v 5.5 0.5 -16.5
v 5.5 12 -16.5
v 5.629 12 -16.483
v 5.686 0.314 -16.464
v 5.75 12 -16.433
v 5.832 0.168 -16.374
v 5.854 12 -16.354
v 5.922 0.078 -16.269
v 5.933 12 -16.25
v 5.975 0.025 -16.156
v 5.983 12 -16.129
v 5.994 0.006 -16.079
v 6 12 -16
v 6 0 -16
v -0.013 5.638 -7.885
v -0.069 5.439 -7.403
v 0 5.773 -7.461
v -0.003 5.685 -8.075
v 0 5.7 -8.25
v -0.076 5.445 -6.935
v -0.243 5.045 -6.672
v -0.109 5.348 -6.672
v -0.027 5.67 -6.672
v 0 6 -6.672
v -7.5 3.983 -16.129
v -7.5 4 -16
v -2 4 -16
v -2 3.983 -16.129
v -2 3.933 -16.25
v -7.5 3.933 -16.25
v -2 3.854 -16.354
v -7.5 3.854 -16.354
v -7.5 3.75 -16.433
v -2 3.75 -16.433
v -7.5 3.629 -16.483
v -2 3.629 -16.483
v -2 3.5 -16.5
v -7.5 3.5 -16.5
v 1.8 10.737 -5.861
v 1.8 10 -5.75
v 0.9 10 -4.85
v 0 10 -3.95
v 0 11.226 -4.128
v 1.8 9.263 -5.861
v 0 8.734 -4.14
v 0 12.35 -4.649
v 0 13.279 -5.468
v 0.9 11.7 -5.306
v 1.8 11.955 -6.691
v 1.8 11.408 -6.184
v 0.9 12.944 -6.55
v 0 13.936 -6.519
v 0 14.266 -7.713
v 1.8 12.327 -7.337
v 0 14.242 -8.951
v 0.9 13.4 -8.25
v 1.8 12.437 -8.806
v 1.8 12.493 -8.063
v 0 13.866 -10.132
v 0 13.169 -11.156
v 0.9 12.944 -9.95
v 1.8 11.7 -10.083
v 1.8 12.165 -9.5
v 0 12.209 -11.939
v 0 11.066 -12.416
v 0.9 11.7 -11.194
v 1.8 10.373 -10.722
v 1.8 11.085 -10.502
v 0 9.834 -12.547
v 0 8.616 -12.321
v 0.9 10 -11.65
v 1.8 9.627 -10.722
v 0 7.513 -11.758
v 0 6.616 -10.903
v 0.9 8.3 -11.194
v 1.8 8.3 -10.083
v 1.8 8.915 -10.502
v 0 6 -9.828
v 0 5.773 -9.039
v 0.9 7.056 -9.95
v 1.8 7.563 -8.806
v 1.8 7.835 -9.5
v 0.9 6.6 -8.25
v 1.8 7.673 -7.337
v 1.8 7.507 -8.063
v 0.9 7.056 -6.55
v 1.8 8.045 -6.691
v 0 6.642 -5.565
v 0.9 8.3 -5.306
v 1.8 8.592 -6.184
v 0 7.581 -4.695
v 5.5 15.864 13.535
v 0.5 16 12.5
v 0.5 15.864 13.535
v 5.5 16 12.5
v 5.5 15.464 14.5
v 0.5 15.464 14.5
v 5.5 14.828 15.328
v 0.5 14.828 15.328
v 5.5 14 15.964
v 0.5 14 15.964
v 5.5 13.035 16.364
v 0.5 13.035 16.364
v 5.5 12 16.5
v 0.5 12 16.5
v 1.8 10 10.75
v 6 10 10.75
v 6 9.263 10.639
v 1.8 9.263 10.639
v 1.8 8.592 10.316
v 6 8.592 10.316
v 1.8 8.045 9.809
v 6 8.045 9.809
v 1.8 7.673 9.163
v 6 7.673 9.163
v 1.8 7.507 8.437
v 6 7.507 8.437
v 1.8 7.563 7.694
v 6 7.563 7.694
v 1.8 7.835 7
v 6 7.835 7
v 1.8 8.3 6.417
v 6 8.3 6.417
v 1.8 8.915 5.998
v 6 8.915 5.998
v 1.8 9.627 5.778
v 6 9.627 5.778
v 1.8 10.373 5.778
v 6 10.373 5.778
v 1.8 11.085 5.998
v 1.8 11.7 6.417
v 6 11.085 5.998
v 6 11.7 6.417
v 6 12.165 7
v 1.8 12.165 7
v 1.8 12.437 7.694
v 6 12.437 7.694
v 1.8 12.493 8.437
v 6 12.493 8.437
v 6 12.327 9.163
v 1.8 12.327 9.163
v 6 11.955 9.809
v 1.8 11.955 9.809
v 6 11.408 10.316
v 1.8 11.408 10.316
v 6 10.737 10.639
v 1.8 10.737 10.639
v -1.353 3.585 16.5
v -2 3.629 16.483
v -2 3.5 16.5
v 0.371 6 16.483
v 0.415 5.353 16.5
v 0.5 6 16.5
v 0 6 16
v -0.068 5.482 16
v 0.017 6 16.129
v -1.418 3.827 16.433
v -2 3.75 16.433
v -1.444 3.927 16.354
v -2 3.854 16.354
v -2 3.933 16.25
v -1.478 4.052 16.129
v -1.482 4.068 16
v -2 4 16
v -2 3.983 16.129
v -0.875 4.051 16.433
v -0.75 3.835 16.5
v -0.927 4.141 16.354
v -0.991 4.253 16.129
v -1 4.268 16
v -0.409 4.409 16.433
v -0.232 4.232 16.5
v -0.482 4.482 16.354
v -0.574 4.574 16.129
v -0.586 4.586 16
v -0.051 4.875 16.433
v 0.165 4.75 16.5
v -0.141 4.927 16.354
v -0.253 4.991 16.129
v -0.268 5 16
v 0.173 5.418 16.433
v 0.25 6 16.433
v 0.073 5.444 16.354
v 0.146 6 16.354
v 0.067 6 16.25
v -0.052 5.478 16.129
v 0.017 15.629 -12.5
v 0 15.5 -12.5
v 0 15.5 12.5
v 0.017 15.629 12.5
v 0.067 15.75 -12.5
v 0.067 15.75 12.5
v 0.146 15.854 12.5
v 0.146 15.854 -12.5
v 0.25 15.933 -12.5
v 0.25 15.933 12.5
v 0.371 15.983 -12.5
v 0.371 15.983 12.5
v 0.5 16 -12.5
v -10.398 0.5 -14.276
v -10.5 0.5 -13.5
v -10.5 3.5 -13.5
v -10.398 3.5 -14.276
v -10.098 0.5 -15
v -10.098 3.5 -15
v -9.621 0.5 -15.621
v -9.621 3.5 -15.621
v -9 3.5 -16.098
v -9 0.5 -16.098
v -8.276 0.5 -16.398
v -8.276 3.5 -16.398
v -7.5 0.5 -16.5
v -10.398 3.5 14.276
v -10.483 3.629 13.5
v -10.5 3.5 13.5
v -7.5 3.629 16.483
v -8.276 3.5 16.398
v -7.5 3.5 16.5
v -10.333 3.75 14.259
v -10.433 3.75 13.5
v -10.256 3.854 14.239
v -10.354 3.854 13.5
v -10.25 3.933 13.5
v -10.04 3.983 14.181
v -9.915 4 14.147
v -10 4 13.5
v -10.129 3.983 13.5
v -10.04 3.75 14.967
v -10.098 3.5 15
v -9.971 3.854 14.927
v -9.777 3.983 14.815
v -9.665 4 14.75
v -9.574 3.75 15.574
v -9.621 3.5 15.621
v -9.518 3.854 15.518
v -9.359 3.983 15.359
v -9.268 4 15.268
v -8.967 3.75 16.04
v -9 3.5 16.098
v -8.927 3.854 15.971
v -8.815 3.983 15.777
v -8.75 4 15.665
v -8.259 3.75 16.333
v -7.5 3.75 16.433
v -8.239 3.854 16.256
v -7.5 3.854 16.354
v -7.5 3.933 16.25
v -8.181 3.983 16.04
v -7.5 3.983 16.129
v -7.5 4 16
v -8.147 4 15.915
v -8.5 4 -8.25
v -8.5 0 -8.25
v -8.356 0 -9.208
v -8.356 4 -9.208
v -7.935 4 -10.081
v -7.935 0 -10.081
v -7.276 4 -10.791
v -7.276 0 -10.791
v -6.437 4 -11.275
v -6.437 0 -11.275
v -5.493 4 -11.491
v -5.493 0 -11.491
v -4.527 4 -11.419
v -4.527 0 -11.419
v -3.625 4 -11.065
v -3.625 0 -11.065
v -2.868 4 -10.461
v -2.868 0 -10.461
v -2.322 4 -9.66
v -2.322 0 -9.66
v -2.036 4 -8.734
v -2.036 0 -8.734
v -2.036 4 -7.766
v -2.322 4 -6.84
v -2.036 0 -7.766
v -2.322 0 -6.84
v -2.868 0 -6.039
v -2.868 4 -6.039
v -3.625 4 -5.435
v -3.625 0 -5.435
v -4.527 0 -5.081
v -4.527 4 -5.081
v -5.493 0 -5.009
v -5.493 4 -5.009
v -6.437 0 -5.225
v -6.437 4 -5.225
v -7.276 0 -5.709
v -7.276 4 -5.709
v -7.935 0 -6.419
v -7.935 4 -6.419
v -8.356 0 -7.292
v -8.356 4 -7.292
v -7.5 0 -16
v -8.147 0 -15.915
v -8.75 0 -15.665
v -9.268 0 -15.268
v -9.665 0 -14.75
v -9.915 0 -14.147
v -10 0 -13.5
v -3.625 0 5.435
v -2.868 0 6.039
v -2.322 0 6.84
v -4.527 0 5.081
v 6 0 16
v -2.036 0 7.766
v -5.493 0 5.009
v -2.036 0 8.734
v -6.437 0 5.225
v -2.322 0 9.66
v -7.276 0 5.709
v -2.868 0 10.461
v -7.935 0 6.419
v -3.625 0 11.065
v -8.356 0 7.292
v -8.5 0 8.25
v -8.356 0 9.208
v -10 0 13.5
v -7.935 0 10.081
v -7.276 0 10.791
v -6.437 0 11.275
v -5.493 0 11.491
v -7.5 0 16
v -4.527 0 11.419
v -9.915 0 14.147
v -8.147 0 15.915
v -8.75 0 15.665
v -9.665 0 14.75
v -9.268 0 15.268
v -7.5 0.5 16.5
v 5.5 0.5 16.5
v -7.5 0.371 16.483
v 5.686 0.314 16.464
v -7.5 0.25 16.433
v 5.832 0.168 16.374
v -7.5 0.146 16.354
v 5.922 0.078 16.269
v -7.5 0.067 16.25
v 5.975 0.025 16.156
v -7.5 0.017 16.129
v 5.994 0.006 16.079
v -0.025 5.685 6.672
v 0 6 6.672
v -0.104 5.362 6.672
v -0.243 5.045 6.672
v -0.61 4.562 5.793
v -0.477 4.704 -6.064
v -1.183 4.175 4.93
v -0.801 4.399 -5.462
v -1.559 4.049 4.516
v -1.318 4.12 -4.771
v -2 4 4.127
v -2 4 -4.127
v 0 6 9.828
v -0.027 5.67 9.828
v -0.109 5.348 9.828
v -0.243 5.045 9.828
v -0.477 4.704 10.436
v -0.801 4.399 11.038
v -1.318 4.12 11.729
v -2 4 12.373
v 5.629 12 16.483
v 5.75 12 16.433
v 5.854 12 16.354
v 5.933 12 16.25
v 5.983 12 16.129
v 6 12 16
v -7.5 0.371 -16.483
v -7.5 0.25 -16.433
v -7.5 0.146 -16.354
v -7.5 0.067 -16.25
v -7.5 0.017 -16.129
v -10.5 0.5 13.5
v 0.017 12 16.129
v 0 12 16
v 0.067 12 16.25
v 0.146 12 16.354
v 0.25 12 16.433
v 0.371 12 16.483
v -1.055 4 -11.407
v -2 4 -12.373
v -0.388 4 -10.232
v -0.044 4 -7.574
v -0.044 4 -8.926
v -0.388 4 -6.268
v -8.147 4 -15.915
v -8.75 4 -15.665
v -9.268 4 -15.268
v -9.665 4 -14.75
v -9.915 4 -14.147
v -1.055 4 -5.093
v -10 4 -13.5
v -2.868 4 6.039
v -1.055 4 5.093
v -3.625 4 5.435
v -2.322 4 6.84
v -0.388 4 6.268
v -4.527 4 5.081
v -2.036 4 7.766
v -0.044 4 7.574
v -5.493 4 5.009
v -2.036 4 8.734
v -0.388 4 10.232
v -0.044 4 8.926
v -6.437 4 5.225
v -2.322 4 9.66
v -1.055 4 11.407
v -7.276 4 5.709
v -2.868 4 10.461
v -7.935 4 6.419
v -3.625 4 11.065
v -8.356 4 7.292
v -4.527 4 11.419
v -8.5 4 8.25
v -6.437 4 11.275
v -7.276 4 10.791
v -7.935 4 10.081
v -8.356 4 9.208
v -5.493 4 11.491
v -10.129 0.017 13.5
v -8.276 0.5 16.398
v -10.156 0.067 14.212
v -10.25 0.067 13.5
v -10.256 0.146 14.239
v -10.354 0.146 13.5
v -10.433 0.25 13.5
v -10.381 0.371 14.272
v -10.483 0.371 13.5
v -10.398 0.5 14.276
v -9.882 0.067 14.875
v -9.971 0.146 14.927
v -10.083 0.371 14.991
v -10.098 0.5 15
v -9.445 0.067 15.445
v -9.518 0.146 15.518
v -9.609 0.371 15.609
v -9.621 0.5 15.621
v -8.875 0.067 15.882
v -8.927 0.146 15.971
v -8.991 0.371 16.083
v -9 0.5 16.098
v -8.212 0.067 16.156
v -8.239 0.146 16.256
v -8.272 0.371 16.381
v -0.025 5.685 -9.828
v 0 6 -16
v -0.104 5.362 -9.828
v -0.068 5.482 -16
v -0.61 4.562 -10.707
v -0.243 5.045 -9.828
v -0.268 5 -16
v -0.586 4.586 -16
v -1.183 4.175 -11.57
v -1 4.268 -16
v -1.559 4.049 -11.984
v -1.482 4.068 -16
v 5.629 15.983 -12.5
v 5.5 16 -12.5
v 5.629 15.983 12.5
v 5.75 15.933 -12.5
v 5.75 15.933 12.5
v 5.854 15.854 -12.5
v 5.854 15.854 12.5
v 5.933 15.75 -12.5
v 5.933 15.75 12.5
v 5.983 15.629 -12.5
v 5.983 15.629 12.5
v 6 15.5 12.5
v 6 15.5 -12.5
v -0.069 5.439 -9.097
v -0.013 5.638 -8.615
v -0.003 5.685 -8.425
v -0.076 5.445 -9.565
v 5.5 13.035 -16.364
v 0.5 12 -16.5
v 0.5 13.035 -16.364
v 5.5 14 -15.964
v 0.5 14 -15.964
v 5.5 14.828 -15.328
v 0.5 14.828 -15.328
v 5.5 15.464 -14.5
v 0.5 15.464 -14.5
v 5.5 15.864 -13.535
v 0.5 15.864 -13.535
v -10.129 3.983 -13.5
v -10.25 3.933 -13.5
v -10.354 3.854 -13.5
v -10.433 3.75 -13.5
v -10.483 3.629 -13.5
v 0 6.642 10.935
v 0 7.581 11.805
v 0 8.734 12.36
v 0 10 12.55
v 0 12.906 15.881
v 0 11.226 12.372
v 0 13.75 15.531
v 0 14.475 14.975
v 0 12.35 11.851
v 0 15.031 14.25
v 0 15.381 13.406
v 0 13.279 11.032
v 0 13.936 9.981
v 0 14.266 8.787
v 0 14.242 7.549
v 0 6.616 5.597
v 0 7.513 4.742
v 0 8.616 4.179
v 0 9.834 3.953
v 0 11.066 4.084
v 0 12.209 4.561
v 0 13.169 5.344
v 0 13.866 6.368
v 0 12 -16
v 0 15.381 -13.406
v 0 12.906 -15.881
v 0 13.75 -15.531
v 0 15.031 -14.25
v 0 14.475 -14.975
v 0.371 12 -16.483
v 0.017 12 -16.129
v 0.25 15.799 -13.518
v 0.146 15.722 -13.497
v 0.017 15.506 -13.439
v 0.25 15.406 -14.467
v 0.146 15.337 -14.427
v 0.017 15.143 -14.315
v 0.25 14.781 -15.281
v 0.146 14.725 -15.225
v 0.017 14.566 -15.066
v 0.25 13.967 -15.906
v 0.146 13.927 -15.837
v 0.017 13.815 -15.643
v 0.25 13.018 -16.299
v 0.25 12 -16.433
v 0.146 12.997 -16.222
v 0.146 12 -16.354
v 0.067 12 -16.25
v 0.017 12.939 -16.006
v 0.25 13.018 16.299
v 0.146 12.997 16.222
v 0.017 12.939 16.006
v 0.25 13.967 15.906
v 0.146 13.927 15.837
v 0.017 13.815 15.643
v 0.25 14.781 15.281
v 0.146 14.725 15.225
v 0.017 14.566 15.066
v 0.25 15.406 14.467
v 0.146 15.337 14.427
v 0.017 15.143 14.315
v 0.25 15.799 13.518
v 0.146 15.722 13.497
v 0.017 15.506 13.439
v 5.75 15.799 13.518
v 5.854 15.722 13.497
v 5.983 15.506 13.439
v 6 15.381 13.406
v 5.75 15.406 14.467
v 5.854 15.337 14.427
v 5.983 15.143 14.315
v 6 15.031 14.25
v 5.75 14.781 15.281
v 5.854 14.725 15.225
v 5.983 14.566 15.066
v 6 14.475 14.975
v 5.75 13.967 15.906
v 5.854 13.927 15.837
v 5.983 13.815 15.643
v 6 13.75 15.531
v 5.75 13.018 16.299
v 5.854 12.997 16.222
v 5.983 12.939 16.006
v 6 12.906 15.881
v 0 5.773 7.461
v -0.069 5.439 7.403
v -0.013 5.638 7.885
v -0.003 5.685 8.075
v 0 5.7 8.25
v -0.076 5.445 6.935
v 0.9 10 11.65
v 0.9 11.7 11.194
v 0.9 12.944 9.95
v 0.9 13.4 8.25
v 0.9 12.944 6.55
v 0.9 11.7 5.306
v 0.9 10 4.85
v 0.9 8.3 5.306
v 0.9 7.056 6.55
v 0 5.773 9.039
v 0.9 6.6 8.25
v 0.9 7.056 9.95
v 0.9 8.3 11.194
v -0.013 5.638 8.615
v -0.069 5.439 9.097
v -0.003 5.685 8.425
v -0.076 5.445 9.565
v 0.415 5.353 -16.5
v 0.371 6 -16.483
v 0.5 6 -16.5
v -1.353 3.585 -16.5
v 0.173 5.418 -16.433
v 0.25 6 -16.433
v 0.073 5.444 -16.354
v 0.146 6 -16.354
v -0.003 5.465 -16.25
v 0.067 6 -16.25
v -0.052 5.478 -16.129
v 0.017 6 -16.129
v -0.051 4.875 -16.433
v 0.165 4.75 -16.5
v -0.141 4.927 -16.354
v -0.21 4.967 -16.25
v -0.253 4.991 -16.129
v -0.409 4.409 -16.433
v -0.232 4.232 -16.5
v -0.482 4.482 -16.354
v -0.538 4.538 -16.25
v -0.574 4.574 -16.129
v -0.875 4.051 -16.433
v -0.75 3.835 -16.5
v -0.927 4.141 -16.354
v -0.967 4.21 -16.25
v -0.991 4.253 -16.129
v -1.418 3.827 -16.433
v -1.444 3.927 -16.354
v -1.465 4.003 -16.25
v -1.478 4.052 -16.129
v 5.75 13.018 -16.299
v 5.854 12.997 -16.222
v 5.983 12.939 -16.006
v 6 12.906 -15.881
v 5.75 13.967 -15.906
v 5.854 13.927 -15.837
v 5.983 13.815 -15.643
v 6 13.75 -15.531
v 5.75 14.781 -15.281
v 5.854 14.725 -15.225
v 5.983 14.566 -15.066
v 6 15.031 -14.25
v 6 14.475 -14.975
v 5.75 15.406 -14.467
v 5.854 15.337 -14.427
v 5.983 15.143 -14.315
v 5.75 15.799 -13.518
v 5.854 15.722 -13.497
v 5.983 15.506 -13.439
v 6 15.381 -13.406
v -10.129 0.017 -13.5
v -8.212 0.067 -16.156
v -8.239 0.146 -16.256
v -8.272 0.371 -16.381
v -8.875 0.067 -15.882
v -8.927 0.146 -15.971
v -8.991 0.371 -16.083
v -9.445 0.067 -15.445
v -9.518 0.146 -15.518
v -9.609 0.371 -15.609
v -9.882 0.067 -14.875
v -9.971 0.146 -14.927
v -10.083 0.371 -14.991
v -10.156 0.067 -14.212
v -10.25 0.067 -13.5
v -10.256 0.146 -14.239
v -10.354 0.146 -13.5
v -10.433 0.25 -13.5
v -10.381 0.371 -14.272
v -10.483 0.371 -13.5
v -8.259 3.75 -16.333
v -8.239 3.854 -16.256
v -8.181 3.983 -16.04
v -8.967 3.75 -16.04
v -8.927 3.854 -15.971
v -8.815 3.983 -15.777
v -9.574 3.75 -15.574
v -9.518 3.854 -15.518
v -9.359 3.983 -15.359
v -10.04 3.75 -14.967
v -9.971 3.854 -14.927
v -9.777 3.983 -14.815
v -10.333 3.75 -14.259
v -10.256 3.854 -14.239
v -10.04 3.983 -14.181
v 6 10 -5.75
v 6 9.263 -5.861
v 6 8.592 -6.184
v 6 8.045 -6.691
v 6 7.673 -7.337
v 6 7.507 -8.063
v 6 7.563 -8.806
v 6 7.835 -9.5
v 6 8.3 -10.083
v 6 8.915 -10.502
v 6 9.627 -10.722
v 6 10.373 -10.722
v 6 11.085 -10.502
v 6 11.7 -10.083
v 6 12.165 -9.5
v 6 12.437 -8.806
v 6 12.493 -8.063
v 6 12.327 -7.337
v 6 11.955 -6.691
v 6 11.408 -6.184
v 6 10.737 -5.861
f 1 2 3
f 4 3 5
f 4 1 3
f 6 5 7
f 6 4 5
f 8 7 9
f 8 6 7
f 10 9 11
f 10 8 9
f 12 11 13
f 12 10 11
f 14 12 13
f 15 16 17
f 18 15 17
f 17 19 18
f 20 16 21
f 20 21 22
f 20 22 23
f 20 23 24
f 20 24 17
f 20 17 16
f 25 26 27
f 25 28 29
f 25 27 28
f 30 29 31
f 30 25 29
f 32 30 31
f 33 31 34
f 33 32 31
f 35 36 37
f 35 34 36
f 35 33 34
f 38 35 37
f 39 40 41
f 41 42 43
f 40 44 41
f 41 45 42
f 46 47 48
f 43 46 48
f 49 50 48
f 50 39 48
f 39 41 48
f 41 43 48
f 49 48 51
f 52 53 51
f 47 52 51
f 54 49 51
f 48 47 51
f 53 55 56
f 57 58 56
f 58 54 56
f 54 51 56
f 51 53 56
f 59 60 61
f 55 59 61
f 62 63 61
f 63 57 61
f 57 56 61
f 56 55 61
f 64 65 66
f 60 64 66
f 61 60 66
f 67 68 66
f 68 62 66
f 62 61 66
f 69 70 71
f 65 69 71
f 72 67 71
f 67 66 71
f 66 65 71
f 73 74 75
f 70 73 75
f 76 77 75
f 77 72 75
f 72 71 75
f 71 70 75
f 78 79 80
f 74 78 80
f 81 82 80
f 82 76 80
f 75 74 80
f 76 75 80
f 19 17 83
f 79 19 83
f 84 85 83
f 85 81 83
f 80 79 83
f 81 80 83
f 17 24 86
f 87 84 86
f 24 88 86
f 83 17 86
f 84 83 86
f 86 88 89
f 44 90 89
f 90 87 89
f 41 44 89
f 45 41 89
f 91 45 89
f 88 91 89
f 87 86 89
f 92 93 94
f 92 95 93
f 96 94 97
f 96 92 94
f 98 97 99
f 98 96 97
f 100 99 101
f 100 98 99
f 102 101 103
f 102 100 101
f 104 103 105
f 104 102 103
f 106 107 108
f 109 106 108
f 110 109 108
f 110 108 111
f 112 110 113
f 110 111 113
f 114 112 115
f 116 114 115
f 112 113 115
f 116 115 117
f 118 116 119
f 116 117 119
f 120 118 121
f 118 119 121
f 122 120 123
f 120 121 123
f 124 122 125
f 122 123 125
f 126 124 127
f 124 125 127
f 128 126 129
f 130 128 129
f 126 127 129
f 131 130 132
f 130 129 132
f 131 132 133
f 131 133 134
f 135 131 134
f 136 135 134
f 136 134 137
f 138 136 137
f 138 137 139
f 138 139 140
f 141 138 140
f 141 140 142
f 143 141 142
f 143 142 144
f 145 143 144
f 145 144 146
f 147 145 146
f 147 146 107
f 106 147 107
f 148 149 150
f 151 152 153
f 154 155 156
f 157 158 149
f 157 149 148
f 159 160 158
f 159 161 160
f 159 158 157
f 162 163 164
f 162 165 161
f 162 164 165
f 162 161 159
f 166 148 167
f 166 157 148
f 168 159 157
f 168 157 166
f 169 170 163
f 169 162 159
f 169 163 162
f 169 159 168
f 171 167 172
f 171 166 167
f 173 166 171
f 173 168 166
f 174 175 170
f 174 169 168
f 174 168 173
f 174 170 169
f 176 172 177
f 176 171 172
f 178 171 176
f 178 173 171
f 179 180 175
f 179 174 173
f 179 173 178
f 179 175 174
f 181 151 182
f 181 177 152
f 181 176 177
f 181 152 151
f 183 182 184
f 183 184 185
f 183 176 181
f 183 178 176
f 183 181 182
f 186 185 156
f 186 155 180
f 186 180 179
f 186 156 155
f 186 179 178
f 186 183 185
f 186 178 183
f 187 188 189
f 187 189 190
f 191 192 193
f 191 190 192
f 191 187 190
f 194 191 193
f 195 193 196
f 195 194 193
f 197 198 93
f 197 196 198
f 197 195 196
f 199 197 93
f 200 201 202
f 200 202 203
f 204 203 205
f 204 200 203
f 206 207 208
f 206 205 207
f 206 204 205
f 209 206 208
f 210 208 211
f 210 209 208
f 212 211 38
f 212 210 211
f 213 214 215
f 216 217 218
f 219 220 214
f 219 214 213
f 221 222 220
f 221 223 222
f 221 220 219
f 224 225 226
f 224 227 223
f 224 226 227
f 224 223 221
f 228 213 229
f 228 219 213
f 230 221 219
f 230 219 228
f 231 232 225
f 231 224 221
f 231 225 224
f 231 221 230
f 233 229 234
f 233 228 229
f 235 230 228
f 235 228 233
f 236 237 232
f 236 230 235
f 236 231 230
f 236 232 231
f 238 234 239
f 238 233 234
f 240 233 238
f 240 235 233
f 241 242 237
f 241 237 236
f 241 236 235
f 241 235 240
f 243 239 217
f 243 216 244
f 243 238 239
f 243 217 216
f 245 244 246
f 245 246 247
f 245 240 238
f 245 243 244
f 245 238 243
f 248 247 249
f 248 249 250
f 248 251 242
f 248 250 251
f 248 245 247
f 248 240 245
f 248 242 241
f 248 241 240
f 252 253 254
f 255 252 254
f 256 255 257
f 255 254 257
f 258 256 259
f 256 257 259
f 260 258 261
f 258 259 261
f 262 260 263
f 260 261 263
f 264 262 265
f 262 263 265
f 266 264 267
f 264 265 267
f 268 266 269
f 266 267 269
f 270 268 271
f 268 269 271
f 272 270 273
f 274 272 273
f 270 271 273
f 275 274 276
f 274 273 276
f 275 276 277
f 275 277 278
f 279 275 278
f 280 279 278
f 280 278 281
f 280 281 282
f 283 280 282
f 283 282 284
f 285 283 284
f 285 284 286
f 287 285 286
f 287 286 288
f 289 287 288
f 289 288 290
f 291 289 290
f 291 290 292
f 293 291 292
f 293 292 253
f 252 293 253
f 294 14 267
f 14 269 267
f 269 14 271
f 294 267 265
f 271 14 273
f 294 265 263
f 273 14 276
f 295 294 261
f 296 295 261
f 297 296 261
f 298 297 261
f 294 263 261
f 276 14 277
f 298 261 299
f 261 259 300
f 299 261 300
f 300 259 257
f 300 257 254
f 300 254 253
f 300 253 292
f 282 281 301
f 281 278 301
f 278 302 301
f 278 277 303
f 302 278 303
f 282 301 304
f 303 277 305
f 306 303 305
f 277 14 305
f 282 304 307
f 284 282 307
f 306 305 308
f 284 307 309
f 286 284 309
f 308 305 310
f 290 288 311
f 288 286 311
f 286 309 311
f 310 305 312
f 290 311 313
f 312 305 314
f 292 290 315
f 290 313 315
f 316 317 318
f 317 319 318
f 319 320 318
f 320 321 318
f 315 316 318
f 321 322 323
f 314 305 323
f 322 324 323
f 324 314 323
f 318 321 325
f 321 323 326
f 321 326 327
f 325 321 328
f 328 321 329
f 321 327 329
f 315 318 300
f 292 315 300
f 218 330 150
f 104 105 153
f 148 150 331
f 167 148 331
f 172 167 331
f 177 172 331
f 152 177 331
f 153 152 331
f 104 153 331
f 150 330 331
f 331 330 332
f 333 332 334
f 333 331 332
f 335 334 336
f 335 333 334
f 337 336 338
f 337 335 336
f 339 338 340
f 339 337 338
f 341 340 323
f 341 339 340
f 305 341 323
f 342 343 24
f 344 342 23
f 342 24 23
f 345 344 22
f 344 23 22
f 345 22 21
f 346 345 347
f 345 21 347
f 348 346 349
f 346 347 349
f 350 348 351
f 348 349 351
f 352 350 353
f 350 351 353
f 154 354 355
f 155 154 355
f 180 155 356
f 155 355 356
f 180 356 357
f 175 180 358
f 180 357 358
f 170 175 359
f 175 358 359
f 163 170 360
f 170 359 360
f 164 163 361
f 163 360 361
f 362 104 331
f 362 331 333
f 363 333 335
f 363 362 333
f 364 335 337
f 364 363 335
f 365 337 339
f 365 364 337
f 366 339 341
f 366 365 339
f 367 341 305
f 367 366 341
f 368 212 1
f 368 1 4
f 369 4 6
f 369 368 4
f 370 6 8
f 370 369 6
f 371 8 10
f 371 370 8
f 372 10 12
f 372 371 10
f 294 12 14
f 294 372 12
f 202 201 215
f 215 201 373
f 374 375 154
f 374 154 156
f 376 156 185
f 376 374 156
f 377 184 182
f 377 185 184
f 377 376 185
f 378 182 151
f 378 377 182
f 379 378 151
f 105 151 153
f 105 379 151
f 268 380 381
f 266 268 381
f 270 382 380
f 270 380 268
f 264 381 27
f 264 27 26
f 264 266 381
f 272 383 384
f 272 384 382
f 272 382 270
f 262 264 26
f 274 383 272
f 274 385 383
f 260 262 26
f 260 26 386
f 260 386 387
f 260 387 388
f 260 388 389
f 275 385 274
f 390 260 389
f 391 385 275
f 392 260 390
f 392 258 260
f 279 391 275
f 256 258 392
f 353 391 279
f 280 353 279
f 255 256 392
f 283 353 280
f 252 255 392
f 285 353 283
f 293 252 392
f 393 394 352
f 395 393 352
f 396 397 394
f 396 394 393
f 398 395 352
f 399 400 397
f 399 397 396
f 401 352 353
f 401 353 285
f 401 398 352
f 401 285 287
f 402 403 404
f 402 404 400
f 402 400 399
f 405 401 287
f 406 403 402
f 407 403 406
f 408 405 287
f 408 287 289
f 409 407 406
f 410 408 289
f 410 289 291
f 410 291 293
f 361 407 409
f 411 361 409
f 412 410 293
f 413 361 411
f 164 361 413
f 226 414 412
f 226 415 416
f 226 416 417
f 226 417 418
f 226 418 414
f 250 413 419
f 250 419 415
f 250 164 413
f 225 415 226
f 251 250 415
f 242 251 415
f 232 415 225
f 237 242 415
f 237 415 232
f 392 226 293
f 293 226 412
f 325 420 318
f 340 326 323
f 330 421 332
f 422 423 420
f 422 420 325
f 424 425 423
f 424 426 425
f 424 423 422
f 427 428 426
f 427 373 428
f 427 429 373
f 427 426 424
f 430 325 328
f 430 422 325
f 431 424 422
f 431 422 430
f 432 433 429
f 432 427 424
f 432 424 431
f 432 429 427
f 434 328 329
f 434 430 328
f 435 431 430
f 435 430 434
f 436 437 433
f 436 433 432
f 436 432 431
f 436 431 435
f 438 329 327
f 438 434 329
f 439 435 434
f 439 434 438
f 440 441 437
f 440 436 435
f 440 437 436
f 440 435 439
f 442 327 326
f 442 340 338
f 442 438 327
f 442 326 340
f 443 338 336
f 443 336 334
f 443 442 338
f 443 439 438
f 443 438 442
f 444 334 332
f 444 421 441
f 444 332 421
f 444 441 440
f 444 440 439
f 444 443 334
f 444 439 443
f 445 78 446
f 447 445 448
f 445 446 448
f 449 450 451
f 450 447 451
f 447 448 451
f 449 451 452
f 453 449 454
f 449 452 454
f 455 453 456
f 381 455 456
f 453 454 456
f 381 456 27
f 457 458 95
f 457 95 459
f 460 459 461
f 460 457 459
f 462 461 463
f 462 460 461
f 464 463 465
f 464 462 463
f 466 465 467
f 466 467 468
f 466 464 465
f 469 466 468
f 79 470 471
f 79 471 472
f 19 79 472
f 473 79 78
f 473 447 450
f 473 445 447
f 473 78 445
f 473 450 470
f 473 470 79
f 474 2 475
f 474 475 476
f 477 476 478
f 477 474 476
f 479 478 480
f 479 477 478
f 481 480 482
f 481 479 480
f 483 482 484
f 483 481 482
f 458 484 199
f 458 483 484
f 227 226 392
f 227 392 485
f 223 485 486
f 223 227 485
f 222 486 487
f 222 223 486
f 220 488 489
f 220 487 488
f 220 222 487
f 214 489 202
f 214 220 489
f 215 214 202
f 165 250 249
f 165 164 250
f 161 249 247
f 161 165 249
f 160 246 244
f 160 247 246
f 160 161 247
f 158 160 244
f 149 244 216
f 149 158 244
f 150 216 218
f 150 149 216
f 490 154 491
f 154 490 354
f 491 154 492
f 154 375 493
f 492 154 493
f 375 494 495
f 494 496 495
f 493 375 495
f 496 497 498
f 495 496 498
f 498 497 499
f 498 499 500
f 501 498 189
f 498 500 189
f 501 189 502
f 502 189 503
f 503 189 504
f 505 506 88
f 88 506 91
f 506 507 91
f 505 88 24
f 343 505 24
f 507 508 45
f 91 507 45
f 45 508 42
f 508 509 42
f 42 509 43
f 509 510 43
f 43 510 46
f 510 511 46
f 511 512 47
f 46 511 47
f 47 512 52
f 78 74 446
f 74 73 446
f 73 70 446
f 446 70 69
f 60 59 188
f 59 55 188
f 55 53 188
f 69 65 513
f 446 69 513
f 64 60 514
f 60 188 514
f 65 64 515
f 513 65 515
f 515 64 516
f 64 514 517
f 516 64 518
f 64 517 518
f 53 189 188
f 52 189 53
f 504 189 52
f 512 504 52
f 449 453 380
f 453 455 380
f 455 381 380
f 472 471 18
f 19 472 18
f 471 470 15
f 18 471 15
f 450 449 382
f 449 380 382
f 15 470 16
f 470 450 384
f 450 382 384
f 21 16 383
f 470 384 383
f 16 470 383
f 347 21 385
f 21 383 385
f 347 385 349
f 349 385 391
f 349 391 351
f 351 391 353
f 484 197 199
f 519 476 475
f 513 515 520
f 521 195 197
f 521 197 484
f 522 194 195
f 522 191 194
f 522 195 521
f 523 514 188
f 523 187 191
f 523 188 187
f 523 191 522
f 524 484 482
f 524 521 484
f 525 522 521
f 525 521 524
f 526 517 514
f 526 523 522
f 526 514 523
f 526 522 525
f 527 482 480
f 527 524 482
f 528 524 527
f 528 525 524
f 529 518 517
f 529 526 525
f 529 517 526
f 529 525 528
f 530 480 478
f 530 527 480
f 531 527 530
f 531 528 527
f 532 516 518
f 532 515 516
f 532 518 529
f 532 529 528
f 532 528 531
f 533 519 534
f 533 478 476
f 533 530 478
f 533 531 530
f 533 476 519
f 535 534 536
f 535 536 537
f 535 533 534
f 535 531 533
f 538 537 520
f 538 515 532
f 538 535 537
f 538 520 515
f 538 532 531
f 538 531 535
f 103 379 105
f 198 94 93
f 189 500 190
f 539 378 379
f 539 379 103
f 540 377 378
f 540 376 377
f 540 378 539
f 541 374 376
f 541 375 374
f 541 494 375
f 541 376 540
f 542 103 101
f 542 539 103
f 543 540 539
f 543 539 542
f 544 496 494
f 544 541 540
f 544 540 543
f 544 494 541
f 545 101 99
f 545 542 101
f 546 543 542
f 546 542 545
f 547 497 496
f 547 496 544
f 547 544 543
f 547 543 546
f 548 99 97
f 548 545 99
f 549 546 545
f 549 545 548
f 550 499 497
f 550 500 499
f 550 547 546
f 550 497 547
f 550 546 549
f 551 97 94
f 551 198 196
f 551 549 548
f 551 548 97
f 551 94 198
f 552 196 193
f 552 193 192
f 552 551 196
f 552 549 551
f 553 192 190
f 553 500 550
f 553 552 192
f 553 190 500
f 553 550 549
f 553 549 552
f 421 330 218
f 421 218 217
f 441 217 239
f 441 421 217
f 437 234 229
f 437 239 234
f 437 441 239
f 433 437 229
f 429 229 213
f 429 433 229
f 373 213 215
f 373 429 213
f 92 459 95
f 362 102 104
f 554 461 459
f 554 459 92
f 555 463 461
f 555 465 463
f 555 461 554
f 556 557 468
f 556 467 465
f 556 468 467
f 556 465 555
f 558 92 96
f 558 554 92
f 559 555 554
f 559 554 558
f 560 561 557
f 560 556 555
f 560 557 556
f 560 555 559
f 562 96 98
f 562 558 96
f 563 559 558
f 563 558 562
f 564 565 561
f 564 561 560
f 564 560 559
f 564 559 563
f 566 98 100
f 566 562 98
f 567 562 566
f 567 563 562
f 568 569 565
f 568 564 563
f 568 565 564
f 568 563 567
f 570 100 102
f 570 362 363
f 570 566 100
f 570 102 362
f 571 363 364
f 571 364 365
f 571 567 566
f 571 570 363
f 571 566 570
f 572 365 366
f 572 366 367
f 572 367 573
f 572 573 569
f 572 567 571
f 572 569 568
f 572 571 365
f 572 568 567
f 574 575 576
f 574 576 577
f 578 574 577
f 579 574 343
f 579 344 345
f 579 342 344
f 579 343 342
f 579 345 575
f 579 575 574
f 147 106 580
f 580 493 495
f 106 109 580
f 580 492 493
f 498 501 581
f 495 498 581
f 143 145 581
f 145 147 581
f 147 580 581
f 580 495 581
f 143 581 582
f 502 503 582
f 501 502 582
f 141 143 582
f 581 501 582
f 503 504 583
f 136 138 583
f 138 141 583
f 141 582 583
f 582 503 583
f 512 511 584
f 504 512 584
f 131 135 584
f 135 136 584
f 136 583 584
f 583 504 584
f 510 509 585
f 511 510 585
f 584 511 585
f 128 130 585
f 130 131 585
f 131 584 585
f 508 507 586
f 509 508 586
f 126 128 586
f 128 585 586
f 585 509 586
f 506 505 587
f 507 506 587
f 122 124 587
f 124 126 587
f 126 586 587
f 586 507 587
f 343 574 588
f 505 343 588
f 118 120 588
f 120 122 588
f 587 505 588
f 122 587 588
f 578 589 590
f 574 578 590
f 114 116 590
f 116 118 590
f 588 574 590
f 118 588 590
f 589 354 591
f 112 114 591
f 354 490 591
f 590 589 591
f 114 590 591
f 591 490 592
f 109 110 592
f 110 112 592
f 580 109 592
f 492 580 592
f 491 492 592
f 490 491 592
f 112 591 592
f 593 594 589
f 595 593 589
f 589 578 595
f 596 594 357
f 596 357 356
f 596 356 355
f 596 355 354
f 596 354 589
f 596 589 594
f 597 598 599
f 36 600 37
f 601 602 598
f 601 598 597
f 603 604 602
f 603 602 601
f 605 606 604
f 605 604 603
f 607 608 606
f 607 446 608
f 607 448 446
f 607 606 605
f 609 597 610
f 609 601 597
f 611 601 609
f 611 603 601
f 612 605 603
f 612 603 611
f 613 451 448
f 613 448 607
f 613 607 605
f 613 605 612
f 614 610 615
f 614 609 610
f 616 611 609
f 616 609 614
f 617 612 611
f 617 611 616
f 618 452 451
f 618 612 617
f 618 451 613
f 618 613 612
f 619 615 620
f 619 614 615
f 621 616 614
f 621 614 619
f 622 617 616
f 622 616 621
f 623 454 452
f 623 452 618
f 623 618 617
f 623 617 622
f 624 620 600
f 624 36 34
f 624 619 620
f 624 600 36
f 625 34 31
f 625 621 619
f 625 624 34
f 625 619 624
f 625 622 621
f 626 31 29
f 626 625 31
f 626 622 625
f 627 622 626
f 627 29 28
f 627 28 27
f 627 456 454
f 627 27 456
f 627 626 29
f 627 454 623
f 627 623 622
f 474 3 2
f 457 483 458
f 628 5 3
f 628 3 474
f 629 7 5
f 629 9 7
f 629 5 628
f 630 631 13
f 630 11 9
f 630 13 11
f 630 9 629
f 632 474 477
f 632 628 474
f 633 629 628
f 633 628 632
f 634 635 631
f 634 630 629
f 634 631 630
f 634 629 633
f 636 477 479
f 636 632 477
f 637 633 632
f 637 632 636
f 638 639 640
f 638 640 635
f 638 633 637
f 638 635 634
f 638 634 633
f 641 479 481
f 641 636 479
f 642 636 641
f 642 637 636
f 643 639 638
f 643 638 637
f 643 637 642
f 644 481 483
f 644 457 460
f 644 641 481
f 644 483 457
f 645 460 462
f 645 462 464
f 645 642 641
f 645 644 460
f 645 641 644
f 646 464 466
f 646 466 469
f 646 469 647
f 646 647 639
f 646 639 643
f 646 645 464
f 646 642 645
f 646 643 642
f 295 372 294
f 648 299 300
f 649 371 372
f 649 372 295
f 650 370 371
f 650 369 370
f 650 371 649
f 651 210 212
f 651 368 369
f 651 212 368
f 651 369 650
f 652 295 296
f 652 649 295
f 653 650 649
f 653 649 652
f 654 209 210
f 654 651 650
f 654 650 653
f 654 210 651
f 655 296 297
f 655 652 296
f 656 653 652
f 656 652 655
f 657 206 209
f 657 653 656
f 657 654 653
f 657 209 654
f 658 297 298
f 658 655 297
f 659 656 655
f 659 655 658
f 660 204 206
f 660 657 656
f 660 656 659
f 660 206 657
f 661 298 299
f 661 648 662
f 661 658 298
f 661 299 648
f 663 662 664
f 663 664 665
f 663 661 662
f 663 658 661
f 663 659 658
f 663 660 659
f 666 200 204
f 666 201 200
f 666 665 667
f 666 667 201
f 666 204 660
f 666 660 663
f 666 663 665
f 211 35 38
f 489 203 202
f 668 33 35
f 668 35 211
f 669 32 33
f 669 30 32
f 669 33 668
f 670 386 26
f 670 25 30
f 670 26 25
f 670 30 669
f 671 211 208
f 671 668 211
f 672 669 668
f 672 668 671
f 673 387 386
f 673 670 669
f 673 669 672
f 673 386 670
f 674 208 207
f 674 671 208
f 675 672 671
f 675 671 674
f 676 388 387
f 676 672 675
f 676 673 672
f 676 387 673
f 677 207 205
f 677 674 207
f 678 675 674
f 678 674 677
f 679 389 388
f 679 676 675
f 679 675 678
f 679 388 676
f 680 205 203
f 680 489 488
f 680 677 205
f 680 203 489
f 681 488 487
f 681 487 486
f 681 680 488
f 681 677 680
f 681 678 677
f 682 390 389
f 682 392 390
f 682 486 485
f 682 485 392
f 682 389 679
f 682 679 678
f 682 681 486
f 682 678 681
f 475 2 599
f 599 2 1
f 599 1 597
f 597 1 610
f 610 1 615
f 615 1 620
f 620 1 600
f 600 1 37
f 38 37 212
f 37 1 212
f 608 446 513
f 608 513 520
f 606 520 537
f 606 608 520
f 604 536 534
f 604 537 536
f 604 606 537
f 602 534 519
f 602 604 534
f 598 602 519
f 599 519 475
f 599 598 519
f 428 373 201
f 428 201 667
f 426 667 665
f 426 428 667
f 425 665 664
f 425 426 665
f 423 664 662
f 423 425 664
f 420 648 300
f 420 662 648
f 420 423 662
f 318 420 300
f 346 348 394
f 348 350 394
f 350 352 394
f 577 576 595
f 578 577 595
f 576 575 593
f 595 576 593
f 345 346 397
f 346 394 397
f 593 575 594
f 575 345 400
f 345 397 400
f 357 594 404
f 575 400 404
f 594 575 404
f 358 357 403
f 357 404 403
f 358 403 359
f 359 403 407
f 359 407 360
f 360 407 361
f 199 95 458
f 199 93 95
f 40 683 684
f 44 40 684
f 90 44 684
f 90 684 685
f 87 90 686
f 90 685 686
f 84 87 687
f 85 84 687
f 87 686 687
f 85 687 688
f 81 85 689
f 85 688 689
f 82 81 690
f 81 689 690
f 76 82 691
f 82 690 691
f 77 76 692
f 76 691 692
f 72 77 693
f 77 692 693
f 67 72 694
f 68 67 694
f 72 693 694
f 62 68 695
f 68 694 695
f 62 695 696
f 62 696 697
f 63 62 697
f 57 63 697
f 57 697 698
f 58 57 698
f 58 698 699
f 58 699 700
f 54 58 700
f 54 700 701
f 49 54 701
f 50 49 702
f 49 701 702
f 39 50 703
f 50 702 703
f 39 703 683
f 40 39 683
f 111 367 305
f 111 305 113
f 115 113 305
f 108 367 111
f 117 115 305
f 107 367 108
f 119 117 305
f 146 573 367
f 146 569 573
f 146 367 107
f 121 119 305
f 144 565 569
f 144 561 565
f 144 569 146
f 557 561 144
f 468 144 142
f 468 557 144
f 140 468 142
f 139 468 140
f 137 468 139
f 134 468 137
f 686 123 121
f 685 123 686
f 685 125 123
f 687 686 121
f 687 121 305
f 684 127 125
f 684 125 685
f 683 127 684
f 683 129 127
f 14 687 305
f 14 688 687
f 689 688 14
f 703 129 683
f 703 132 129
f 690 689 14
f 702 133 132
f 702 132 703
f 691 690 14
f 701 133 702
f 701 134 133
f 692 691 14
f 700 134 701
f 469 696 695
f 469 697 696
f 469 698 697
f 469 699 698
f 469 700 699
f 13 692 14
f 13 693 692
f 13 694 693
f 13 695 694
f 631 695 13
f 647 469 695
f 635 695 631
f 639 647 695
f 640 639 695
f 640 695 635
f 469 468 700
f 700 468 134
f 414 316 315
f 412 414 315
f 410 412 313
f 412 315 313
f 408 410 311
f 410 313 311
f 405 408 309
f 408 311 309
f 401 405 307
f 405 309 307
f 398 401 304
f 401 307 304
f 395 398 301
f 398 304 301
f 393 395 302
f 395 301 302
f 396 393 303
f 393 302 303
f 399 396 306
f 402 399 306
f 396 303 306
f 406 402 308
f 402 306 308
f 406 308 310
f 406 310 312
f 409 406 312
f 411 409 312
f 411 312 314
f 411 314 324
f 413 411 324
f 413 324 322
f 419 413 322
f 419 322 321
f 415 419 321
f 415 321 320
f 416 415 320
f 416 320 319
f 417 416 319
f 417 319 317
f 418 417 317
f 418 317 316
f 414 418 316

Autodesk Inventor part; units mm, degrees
ref_plane "YZ Plane" through (0, 0, 0) normal (1, 0, 0) x (0, 1, 0)
ref_plane "XZ Plane" through (0, 0, 0) normal (0, 1, 0) x (-1, 0, 0)
ref_plane "XY Plane" through (0, 0, 0) normal (0, 0, 1) x (1, 0, 0)
sketch "Skizze1" plane through (0, 0, 0) normal (0, 1, 0) x (-1, 0, 0)
  line L0 (7.5, 16.5) -> (0, 16.5)
  line L1 (0, 16.5) -> (0, -16.5)
  line L2 (0, -16.5) -> (7.5, -16.5)
  line L3 (10.5, -13.5) -> (10.5, 13.5)
  circle A0 centre (5.25, 8.25) radius 3.25
  line L4 (10.5, 0) -> (0, 0) construction
  circle A1 centre (5.25, -8.25) radius 3.25
  arc A2 (10.5, 13.5) -> (7.5, 16.5) centre (7.5, 13.5) ccw
  arc A3 (7.5, -16.5) -> (10.5, -13.5) centre (7.5, -13.5) ccw
  point P0 (5.25, 0)
  dimension "d0" = 2
  dimension "d1" = 6.5
  dimension "d2" = 5
  dimension "d3" = 10
  dimension "d4" = 3
extrude "Extrusion1" add sketch "Skizze1" along normal blind 4
sketch "Skizze3" plane through (0, 0, 16.5) normal (1, 0, 0) x (0, 0, -1)
  line L0 (0, 0) -> (33, 0) projected
  line L1 (33, 0) -> (0, 0)
  line L2 (0, 0) -> (0, 16)
  line L3 (0, 16) -> (33, 16)
  line L4 (33, 16) -> (33, 0)
  point P0 (16.5, 0)
  point P1 (33, 4)
  dimension "d21" = 12
extrude "Extrusion2" add sketch "Skizze3" along normal blind 6
sketch "Skizze4" plane through (0, 0, 16.5) normal (-1, 0, 0) x (0, 0, 1)
  point P0 (-16.5, 0)
sketch "Skizze5" plane through (0, 0, 16.5) normal (-1, 0, 0) x (0, 0, 1)
  line L0 (0, 4) -> (-33, 4) projected
  line L1 (0, 16) -> (0, 4) projected
  line L2 (-33, 16) -> (0, 16) projected
  line L3 (-33, 4) -> (-33, 16) projected
  line L4 (-33, 16) -> (0, 16) construction
  line L5 (-16.5, 16) -> (-16.5, 4) construction
  line L6 (-30, 4) -> (-3, 4) construction
  line L7 (-16.5, 10) -> (-33, 10) construction
  line L8 (-33, 0) -> (-33, 16) construction
  point P0 (-16.5, 0)
  point P1 (-24.75, 10)
  point P2 (-8.25, 10)
  point P3 (-24.75, 10)
hole "Bohrung1" at (0, 10, 8.25) at (0, 10, -8.25) direction (1, 0, 0) diameter 5 end through all countersink diameter 8.6 countersink angle 90
fillet "Rundung1" radius 2 1 edges at (0, 4, 0)
fillet "Rundung2" radius 4 2 edges at (3, 16, 16.5) (3, 16, -16.5)
fillet "Rundung3" radius 0.5 22 edges at (6, 14.8284, 15.3284) (6, 16, 0) (6, 14.8284, -15.3284) (6, 6, -16.5) (6, 6, 16.5) (-9.6213, 0, 15.6213) (-10.5, 0, 0) (-9.6213, 0, -15.6213) (-0.75, 0, -16.5) (-0.75, 0, 16.5) (0, 9, 16.5) (-0.5858, 4.5858, 16.5) (-4.75, 4, 16.5) (-9.6213, 4, 15.6213) (-10.5, 4, 0) (-9.6213, 4, -15.6213) (-4.75, 4, -16.5) (-0.5858, 4.5858, -16.5) (0, 9, -16.5) (0, 14.8284, -15.3284) (0, 16, 0) (0, 14.8284, 15.3284)
sketch "Skizze7" plane through (0, 4, 0) normal (0, 1, 0) x (1, 0, 0)
  circle A0 centre (-5.25, -8.25) radius 3.25 projected
  circle A1 centre (-5.25, 8.25) radius 3.25 projected
  circle A2 centre (-5.25, -8.25) radius 5.25
  circle A3 centre (-5.25, 8.25) radius 5.25
  point P0 (0, 0)
  point P1 (-2, -8.25)
  point P2 (-2, 8.25)
  dimension "d32" = 2
extrude "Extrusion3" cut sketch "Skizze7" along normal up to surface (12 mm away)
properties part number "Wlan-antennen-halter"
